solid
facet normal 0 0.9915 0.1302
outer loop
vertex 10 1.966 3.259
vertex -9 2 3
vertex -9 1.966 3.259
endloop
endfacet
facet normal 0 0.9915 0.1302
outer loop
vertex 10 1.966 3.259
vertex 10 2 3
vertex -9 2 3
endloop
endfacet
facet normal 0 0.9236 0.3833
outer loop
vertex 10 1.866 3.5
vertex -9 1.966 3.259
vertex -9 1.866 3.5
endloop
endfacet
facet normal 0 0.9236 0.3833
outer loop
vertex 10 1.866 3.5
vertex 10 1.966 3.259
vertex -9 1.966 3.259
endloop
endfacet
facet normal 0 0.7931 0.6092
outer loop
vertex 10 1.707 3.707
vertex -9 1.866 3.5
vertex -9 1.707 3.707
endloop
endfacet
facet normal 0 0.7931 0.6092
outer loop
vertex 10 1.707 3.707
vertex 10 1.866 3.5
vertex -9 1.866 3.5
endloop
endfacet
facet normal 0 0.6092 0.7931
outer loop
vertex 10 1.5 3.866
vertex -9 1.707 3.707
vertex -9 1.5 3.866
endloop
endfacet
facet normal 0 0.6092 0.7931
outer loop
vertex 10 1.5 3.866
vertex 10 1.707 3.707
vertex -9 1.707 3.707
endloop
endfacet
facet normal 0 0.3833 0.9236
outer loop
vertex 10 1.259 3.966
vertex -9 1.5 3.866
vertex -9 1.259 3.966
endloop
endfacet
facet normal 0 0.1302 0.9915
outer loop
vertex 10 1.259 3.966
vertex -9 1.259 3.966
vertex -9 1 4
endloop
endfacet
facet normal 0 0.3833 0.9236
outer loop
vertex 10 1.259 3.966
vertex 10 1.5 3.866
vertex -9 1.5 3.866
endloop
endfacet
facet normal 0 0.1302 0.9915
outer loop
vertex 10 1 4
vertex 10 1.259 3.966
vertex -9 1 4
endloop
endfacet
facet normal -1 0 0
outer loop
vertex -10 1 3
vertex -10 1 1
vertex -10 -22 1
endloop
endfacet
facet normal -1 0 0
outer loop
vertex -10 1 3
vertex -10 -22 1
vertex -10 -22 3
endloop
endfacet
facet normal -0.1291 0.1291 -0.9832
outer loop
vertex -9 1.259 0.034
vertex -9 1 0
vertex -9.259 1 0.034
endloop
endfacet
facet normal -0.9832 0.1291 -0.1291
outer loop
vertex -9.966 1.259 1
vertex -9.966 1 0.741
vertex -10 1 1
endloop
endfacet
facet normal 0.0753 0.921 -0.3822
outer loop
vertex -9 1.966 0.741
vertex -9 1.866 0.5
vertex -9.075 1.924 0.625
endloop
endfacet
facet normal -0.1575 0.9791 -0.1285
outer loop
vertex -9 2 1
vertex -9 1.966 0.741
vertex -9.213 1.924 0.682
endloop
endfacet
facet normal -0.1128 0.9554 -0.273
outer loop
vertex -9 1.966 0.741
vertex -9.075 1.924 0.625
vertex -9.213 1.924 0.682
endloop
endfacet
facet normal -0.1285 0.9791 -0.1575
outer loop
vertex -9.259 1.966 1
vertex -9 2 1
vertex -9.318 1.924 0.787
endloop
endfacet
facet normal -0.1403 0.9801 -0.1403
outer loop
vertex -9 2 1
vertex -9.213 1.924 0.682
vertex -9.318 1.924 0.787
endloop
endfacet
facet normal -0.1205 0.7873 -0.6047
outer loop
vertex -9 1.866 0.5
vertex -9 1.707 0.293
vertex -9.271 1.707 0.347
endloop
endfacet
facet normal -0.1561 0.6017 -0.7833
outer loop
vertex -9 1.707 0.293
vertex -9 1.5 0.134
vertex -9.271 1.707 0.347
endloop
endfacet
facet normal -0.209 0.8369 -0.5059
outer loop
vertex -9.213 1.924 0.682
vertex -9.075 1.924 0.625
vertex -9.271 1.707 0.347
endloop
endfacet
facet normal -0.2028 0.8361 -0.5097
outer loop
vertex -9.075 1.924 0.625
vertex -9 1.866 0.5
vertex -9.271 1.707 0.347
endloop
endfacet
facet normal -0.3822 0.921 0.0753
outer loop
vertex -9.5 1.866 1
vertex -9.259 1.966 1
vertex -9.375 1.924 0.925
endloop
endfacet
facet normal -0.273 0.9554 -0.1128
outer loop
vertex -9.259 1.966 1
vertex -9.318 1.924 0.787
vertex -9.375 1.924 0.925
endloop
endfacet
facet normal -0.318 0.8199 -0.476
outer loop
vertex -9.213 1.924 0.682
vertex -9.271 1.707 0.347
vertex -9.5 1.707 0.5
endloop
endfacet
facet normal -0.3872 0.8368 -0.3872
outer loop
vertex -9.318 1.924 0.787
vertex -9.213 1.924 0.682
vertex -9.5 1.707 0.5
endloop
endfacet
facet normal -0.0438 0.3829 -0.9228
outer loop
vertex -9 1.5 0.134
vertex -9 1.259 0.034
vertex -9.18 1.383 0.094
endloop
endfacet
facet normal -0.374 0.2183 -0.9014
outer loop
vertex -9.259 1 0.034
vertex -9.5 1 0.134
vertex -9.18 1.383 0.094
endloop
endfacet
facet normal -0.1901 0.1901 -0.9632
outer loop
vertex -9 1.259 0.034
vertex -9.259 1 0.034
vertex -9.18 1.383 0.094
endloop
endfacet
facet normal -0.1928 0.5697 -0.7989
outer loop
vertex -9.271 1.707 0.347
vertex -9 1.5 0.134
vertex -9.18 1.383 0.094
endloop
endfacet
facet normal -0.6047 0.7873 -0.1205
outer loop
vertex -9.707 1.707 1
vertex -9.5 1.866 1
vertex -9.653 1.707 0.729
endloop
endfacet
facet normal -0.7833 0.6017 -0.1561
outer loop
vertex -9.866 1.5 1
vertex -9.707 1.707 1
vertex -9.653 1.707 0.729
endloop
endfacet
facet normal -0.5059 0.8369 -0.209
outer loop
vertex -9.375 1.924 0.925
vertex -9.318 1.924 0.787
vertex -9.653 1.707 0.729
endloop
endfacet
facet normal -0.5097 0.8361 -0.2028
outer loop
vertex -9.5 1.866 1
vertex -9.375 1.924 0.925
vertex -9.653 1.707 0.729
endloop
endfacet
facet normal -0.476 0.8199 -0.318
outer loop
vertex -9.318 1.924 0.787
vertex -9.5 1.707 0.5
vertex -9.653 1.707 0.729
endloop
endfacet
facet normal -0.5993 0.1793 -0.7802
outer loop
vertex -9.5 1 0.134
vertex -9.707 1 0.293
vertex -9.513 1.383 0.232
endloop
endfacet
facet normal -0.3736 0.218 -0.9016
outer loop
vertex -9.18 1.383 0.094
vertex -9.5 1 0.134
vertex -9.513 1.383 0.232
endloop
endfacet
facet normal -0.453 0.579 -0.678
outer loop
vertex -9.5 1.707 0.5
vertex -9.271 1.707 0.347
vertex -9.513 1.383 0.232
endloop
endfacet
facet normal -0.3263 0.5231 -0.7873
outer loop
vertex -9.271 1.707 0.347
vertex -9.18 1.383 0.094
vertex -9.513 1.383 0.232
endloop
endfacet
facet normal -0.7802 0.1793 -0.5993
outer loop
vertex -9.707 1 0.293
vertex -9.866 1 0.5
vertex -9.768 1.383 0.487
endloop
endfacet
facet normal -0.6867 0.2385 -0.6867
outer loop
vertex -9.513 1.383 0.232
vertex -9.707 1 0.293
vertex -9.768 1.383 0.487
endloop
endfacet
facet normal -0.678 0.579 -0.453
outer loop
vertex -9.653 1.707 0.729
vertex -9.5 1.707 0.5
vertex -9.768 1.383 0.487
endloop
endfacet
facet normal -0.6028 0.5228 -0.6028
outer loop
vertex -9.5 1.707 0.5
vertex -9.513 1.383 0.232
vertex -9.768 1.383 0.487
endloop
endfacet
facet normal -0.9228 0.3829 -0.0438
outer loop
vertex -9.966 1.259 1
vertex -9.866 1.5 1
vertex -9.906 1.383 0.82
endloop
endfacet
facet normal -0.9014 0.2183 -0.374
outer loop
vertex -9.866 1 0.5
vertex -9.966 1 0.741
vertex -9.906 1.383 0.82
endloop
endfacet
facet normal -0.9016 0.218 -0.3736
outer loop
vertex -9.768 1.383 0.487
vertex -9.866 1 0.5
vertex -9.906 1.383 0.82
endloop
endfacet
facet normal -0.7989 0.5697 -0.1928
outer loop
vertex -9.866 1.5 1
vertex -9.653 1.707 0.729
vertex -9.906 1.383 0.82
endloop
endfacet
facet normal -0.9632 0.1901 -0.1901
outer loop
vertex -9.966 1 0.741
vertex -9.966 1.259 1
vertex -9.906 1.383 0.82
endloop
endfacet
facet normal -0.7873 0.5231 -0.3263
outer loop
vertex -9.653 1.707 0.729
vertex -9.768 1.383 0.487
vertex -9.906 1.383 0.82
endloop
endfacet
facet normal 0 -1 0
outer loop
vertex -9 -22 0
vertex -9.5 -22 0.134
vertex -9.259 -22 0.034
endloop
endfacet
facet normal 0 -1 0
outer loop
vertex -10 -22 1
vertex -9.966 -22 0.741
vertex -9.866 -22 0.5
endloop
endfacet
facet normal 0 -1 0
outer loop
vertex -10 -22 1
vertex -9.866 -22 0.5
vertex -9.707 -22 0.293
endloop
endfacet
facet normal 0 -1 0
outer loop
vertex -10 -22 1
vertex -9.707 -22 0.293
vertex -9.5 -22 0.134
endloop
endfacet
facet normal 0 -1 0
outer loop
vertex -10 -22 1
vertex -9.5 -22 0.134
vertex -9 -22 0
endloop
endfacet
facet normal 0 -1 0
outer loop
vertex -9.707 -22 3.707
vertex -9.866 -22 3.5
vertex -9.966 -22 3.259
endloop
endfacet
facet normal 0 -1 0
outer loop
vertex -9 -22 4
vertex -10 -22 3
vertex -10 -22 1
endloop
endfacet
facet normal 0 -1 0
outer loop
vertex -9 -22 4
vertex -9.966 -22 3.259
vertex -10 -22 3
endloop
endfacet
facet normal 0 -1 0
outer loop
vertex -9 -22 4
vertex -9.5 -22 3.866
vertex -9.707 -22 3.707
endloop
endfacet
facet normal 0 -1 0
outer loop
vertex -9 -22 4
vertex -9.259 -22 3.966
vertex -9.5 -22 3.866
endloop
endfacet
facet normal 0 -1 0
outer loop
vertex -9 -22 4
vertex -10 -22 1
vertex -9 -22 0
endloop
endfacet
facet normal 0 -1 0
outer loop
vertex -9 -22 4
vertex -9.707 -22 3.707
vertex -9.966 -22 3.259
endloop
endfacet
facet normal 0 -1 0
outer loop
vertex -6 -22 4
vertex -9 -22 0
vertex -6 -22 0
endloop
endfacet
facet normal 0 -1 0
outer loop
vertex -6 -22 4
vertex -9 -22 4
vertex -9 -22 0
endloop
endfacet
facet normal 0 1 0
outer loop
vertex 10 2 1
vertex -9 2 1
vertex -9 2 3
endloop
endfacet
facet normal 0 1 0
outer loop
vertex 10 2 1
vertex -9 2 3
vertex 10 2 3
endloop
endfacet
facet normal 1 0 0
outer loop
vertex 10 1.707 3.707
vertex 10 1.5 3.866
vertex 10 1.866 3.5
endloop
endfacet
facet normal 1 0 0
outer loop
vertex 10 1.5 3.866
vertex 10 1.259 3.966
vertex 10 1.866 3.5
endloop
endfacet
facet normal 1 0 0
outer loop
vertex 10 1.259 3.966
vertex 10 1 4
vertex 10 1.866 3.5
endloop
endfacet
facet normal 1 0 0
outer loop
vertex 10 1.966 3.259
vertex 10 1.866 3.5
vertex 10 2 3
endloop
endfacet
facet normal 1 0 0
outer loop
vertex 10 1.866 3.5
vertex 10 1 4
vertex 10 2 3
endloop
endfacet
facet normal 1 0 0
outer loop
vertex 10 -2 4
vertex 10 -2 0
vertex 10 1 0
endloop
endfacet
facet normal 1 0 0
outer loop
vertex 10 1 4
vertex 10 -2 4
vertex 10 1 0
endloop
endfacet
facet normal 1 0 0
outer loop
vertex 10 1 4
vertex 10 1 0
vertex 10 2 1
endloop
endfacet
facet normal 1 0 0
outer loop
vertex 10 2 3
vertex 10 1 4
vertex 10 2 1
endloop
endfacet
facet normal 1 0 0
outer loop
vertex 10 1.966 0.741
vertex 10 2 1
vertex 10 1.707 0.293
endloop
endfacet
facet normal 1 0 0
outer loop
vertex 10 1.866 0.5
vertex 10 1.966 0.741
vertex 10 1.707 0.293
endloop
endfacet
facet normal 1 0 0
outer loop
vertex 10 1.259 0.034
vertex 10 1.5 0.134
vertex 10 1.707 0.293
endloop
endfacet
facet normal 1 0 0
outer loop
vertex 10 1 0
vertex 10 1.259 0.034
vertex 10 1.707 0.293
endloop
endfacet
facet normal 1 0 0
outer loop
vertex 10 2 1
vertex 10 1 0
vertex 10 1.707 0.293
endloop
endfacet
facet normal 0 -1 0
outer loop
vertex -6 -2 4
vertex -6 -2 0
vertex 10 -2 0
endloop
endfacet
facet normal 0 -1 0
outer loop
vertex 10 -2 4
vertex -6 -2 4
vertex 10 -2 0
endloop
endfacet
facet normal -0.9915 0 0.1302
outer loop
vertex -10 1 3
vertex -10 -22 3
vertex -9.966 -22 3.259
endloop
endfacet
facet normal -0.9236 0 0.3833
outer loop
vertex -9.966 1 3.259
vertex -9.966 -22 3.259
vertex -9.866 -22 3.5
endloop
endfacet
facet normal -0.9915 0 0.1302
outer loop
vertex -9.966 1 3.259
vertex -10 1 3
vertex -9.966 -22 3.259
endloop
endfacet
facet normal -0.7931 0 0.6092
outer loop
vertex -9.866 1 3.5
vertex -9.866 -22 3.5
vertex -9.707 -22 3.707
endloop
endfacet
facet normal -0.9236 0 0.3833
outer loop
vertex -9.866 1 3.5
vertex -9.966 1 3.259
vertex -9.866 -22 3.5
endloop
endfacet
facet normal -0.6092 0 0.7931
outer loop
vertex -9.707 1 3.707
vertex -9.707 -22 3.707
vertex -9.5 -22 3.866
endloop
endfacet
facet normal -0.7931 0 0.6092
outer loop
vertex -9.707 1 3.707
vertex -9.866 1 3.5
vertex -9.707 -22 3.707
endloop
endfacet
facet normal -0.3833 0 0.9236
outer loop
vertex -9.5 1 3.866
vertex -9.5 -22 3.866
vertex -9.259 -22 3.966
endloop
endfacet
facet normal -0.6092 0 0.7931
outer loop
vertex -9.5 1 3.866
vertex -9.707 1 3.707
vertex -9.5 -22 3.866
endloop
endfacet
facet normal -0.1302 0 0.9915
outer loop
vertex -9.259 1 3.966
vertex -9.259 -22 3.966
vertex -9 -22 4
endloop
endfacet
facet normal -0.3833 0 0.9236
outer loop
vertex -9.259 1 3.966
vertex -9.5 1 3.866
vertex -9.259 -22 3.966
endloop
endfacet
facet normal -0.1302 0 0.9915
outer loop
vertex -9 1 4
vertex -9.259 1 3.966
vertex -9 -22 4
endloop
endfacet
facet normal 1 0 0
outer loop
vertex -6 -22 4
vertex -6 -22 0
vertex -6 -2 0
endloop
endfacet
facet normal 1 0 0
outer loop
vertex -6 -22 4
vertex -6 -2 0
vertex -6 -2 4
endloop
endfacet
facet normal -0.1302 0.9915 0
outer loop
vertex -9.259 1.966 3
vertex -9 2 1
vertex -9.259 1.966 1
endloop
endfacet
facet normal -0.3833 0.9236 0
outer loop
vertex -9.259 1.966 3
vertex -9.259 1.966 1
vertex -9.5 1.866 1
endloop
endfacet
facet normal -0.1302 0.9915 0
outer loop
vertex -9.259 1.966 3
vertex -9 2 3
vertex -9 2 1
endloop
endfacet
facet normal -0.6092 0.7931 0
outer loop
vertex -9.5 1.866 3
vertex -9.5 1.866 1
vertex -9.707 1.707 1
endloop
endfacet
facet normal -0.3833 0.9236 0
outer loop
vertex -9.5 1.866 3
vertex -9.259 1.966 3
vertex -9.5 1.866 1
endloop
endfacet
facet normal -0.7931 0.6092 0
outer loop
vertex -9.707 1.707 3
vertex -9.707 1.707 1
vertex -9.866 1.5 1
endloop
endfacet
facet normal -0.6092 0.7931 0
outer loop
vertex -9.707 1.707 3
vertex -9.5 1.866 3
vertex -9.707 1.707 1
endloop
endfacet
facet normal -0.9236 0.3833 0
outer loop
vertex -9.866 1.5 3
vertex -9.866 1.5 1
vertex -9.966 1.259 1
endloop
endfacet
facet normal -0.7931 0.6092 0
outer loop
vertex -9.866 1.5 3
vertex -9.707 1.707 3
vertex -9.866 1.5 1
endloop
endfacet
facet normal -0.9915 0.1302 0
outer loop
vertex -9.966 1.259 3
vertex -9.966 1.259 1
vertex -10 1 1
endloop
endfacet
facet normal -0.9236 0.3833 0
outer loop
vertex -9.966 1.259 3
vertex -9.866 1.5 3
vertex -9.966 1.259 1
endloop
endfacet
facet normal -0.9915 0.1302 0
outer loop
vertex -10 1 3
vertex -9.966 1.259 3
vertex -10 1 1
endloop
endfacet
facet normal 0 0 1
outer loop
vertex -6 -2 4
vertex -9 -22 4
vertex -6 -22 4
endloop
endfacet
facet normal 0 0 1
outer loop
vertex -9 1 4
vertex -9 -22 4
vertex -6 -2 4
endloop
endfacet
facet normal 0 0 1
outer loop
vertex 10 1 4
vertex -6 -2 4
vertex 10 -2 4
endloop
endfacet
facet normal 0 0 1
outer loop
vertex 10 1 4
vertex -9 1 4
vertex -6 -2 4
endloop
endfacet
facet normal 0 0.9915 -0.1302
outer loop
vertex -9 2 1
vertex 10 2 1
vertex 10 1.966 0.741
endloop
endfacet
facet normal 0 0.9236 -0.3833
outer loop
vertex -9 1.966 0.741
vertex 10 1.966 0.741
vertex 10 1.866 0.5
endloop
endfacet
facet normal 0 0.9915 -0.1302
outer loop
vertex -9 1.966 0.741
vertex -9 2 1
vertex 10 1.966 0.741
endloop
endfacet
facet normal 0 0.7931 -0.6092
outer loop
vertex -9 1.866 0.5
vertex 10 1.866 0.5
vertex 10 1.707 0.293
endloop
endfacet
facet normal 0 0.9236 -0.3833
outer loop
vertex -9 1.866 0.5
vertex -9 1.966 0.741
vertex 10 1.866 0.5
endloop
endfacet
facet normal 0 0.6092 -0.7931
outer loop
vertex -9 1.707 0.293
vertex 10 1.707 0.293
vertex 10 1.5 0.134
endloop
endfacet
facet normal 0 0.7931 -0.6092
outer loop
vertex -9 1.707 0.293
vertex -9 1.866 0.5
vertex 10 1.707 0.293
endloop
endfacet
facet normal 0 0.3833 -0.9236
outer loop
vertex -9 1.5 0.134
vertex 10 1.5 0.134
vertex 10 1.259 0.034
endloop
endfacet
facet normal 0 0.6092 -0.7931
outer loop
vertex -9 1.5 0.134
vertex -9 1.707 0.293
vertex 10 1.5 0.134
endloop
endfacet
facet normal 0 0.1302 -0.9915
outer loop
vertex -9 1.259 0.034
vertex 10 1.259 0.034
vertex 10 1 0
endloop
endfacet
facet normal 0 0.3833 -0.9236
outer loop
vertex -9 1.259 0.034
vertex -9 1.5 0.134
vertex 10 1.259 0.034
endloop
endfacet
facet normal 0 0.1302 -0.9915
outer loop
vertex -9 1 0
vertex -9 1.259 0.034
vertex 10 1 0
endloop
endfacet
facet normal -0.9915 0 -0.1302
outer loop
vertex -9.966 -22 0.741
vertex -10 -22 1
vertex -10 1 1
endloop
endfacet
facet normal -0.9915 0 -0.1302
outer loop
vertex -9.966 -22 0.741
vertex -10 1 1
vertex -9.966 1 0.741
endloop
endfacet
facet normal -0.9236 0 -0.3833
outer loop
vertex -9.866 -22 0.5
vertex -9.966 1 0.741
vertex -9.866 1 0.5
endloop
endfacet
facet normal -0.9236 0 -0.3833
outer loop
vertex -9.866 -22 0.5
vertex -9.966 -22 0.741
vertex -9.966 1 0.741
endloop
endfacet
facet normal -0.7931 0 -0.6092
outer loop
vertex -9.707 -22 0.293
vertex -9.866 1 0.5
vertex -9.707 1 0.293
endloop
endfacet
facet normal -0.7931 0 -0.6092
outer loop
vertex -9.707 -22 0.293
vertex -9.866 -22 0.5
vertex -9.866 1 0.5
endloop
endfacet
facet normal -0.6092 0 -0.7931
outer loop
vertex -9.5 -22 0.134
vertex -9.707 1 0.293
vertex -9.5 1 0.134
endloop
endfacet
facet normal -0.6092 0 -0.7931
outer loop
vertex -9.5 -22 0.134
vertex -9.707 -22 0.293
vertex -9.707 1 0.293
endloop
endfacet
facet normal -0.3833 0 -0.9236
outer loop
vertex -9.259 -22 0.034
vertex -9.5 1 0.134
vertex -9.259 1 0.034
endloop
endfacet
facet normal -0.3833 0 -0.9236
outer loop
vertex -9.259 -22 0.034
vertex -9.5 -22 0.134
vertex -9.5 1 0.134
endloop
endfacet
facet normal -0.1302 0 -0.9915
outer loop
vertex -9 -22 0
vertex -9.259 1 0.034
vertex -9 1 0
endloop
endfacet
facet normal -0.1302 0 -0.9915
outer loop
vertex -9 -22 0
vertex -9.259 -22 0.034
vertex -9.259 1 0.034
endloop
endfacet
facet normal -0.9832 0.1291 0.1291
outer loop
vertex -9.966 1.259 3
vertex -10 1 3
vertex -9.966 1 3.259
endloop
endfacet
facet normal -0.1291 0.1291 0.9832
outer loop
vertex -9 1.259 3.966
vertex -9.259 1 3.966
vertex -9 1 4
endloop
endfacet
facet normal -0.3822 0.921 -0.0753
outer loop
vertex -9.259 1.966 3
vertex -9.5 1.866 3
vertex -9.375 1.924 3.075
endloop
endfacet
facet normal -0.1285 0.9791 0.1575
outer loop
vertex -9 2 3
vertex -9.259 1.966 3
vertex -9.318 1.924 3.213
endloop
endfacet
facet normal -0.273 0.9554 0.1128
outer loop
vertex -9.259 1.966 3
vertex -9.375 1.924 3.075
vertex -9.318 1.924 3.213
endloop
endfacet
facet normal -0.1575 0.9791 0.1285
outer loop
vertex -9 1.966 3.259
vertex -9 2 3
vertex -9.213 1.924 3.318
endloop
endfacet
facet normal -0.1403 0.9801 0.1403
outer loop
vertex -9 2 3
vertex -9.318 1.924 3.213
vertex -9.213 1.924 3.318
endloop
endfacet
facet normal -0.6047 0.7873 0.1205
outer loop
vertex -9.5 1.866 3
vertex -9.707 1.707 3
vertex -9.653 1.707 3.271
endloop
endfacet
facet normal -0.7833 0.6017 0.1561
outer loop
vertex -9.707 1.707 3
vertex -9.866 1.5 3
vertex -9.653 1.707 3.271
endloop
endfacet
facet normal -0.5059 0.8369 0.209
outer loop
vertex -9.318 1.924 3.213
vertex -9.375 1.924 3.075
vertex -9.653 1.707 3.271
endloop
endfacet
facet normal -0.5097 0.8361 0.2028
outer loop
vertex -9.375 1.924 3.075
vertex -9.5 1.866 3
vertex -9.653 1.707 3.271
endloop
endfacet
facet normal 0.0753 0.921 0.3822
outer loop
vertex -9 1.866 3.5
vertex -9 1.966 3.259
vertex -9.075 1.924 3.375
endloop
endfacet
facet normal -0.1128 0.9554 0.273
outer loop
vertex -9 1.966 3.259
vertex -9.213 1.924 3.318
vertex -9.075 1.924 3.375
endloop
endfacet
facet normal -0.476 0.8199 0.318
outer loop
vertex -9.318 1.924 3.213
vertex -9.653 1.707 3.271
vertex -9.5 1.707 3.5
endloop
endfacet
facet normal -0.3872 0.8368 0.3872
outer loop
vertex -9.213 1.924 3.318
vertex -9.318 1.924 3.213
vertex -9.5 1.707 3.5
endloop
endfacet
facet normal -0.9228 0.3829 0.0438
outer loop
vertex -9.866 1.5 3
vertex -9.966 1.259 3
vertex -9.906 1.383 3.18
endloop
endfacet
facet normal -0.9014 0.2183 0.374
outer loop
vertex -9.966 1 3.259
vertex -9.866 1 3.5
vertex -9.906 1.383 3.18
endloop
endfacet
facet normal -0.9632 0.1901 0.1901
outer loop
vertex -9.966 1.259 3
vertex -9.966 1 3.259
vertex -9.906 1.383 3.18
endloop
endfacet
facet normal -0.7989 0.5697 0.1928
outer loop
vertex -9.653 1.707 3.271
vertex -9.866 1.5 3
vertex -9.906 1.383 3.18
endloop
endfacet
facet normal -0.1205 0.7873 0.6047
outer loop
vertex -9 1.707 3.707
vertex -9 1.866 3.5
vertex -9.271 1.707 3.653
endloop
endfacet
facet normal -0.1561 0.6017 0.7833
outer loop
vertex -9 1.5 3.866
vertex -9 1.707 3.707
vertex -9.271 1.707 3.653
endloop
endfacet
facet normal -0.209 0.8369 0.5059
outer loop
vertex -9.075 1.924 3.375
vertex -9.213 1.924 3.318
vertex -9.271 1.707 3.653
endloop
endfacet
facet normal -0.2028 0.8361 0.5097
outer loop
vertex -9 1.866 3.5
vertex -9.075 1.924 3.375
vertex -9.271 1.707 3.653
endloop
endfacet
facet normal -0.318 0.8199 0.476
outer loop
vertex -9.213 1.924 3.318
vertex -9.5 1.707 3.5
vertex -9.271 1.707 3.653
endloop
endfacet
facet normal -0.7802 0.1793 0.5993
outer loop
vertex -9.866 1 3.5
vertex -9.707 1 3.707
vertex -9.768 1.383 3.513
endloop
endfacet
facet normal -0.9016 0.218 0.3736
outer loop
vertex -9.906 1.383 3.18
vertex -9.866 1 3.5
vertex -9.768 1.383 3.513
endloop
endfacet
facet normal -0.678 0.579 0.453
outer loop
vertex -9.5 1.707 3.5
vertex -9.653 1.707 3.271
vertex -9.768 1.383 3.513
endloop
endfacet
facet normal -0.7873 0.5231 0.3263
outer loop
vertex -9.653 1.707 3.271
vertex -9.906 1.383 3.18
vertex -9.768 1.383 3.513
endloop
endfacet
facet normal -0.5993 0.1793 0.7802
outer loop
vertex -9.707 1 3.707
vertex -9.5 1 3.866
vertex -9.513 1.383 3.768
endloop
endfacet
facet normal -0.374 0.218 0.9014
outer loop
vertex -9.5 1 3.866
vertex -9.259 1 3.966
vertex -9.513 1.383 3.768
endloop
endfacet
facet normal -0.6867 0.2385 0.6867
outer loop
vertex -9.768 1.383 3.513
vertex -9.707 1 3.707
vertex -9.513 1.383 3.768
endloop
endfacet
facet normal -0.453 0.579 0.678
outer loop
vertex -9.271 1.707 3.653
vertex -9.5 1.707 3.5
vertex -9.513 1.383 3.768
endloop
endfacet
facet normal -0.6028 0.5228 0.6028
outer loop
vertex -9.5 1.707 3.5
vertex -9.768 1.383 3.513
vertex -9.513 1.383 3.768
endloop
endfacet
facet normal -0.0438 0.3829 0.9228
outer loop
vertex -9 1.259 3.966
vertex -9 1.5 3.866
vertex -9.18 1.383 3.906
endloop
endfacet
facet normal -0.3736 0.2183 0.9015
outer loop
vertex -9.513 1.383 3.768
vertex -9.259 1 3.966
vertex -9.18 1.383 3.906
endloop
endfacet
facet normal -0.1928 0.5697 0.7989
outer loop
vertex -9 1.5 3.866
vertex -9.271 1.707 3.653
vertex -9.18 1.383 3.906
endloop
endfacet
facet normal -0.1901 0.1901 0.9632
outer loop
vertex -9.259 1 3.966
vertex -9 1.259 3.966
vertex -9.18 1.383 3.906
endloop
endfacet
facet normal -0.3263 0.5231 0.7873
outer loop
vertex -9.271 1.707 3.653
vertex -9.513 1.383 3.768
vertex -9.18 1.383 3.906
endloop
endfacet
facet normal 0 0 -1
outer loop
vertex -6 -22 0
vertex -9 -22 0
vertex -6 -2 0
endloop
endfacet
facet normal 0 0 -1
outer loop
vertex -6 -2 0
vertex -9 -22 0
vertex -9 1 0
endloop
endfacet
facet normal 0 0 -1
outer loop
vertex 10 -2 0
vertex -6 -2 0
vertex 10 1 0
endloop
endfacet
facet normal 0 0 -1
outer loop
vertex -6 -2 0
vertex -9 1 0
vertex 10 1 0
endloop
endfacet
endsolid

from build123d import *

# Parameters (mm, degrees)
F0_W     = 20
F0_H     = 4
F1_DEPTH = 4
F2_W     = 4
F2_H     = 4
F3_DEPTH = 20
F4_R     = 1
F5_R     = 1
F6_R     = 1


with BuildPart() as f1:
    # F0 (on Top) → F1 (new body)
    with BuildSketch(Plane.XY):
        Rectangle(F0_W, F0_H)
    extrude(amount=F1_DEPTH)

    # F2 (on face) → F3 (join)
    with BuildSketch(Plane.XZ.offset(2)):
        with Locations((-8, 2)):
            Rectangle(F2_W, F2_H)
    extrude(amount=F3_DEPTH)

    # F4
    f4_edges = [f1.edges().sort_by_distance(p)[0] for p in [
        (-10, -10, 4),
    ]]
    fillet(f4_edges, radius=F4_R)

    # F5
    f5_edges = [f1.edges().sort_by_distance(p)[0] for p in [
        (-10, -10, 0),
    ]]
    fillet(f5_edges, radius=F5_R)

    # F6
    f6_edges = [f1.edges().sort_by_distance(p)[0] for p in [
        (0.5, 2, 4),
        (0.5, 2, 0),
    ]]
    fillet(f6_edges, radius=F6_R)


solid = f1.part
